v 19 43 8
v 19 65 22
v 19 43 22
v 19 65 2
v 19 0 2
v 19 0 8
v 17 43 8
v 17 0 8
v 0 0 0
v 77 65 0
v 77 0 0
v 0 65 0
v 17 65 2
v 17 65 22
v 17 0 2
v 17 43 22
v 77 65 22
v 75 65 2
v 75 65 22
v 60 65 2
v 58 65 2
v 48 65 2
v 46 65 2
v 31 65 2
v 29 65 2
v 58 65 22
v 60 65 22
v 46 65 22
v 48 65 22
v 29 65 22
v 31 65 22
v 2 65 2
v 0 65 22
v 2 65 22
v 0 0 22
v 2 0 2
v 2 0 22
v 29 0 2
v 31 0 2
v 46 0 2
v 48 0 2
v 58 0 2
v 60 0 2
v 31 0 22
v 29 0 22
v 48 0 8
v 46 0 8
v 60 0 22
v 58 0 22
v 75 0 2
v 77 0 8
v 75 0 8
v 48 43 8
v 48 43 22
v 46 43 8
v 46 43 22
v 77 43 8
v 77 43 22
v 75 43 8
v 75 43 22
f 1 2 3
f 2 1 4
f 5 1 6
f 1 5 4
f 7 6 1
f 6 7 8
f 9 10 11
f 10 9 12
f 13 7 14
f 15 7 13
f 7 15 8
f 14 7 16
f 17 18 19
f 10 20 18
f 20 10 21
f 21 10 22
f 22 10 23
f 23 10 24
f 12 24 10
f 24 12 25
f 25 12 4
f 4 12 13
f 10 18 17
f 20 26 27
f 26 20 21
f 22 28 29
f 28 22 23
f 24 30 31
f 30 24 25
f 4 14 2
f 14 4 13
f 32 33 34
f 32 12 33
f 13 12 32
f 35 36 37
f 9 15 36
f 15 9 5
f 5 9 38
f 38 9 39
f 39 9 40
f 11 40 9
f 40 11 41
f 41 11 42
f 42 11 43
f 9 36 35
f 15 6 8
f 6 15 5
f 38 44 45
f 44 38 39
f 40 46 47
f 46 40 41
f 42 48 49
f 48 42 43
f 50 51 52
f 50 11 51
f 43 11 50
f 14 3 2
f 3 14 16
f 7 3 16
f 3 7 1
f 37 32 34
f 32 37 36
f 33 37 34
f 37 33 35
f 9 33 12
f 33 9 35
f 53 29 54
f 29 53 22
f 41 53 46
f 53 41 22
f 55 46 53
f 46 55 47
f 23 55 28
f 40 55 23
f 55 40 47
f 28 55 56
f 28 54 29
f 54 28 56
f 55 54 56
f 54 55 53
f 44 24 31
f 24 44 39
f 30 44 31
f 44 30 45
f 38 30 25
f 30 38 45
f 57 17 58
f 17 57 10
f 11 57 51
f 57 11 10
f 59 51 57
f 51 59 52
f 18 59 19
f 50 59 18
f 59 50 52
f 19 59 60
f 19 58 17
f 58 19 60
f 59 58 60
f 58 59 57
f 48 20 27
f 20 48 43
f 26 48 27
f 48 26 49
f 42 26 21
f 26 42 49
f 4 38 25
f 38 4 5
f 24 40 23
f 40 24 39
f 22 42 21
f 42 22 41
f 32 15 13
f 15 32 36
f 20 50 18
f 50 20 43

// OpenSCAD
piWidth = 15;
piLength = 65;

baseDepth = 2;
wallDepth = 2;

spacing = 10;

backPlateHeight = 20;

module base_plate()
{
    cube([(3 * (piWidth + (2 * wallDepth)) + (2 * spacing)), piLength, baseDepth]);
}

module slot()
{
    cube([wallDepth, piLength, baseDepth + backPlateHeight]);

    translate([wallDepth + piWidth, 0, 0 ])
    {
        cube([wallDepth, piLength, baseDepth + 6]);

        translate([0, piLength - 22, 0]) {
            cube([wallDepth, 22, baseDepth + backPlateHeight]);
        }
    }
}

base_plate();
slot();

translate([ piWidth + spacing + (2 * wallDepth), 0, 0 ])
{
    slot();
}

translate([ 2 * (piWidth + spacing + (2 * wallDepth)), 0, 0 ])
{
    slot();
}
